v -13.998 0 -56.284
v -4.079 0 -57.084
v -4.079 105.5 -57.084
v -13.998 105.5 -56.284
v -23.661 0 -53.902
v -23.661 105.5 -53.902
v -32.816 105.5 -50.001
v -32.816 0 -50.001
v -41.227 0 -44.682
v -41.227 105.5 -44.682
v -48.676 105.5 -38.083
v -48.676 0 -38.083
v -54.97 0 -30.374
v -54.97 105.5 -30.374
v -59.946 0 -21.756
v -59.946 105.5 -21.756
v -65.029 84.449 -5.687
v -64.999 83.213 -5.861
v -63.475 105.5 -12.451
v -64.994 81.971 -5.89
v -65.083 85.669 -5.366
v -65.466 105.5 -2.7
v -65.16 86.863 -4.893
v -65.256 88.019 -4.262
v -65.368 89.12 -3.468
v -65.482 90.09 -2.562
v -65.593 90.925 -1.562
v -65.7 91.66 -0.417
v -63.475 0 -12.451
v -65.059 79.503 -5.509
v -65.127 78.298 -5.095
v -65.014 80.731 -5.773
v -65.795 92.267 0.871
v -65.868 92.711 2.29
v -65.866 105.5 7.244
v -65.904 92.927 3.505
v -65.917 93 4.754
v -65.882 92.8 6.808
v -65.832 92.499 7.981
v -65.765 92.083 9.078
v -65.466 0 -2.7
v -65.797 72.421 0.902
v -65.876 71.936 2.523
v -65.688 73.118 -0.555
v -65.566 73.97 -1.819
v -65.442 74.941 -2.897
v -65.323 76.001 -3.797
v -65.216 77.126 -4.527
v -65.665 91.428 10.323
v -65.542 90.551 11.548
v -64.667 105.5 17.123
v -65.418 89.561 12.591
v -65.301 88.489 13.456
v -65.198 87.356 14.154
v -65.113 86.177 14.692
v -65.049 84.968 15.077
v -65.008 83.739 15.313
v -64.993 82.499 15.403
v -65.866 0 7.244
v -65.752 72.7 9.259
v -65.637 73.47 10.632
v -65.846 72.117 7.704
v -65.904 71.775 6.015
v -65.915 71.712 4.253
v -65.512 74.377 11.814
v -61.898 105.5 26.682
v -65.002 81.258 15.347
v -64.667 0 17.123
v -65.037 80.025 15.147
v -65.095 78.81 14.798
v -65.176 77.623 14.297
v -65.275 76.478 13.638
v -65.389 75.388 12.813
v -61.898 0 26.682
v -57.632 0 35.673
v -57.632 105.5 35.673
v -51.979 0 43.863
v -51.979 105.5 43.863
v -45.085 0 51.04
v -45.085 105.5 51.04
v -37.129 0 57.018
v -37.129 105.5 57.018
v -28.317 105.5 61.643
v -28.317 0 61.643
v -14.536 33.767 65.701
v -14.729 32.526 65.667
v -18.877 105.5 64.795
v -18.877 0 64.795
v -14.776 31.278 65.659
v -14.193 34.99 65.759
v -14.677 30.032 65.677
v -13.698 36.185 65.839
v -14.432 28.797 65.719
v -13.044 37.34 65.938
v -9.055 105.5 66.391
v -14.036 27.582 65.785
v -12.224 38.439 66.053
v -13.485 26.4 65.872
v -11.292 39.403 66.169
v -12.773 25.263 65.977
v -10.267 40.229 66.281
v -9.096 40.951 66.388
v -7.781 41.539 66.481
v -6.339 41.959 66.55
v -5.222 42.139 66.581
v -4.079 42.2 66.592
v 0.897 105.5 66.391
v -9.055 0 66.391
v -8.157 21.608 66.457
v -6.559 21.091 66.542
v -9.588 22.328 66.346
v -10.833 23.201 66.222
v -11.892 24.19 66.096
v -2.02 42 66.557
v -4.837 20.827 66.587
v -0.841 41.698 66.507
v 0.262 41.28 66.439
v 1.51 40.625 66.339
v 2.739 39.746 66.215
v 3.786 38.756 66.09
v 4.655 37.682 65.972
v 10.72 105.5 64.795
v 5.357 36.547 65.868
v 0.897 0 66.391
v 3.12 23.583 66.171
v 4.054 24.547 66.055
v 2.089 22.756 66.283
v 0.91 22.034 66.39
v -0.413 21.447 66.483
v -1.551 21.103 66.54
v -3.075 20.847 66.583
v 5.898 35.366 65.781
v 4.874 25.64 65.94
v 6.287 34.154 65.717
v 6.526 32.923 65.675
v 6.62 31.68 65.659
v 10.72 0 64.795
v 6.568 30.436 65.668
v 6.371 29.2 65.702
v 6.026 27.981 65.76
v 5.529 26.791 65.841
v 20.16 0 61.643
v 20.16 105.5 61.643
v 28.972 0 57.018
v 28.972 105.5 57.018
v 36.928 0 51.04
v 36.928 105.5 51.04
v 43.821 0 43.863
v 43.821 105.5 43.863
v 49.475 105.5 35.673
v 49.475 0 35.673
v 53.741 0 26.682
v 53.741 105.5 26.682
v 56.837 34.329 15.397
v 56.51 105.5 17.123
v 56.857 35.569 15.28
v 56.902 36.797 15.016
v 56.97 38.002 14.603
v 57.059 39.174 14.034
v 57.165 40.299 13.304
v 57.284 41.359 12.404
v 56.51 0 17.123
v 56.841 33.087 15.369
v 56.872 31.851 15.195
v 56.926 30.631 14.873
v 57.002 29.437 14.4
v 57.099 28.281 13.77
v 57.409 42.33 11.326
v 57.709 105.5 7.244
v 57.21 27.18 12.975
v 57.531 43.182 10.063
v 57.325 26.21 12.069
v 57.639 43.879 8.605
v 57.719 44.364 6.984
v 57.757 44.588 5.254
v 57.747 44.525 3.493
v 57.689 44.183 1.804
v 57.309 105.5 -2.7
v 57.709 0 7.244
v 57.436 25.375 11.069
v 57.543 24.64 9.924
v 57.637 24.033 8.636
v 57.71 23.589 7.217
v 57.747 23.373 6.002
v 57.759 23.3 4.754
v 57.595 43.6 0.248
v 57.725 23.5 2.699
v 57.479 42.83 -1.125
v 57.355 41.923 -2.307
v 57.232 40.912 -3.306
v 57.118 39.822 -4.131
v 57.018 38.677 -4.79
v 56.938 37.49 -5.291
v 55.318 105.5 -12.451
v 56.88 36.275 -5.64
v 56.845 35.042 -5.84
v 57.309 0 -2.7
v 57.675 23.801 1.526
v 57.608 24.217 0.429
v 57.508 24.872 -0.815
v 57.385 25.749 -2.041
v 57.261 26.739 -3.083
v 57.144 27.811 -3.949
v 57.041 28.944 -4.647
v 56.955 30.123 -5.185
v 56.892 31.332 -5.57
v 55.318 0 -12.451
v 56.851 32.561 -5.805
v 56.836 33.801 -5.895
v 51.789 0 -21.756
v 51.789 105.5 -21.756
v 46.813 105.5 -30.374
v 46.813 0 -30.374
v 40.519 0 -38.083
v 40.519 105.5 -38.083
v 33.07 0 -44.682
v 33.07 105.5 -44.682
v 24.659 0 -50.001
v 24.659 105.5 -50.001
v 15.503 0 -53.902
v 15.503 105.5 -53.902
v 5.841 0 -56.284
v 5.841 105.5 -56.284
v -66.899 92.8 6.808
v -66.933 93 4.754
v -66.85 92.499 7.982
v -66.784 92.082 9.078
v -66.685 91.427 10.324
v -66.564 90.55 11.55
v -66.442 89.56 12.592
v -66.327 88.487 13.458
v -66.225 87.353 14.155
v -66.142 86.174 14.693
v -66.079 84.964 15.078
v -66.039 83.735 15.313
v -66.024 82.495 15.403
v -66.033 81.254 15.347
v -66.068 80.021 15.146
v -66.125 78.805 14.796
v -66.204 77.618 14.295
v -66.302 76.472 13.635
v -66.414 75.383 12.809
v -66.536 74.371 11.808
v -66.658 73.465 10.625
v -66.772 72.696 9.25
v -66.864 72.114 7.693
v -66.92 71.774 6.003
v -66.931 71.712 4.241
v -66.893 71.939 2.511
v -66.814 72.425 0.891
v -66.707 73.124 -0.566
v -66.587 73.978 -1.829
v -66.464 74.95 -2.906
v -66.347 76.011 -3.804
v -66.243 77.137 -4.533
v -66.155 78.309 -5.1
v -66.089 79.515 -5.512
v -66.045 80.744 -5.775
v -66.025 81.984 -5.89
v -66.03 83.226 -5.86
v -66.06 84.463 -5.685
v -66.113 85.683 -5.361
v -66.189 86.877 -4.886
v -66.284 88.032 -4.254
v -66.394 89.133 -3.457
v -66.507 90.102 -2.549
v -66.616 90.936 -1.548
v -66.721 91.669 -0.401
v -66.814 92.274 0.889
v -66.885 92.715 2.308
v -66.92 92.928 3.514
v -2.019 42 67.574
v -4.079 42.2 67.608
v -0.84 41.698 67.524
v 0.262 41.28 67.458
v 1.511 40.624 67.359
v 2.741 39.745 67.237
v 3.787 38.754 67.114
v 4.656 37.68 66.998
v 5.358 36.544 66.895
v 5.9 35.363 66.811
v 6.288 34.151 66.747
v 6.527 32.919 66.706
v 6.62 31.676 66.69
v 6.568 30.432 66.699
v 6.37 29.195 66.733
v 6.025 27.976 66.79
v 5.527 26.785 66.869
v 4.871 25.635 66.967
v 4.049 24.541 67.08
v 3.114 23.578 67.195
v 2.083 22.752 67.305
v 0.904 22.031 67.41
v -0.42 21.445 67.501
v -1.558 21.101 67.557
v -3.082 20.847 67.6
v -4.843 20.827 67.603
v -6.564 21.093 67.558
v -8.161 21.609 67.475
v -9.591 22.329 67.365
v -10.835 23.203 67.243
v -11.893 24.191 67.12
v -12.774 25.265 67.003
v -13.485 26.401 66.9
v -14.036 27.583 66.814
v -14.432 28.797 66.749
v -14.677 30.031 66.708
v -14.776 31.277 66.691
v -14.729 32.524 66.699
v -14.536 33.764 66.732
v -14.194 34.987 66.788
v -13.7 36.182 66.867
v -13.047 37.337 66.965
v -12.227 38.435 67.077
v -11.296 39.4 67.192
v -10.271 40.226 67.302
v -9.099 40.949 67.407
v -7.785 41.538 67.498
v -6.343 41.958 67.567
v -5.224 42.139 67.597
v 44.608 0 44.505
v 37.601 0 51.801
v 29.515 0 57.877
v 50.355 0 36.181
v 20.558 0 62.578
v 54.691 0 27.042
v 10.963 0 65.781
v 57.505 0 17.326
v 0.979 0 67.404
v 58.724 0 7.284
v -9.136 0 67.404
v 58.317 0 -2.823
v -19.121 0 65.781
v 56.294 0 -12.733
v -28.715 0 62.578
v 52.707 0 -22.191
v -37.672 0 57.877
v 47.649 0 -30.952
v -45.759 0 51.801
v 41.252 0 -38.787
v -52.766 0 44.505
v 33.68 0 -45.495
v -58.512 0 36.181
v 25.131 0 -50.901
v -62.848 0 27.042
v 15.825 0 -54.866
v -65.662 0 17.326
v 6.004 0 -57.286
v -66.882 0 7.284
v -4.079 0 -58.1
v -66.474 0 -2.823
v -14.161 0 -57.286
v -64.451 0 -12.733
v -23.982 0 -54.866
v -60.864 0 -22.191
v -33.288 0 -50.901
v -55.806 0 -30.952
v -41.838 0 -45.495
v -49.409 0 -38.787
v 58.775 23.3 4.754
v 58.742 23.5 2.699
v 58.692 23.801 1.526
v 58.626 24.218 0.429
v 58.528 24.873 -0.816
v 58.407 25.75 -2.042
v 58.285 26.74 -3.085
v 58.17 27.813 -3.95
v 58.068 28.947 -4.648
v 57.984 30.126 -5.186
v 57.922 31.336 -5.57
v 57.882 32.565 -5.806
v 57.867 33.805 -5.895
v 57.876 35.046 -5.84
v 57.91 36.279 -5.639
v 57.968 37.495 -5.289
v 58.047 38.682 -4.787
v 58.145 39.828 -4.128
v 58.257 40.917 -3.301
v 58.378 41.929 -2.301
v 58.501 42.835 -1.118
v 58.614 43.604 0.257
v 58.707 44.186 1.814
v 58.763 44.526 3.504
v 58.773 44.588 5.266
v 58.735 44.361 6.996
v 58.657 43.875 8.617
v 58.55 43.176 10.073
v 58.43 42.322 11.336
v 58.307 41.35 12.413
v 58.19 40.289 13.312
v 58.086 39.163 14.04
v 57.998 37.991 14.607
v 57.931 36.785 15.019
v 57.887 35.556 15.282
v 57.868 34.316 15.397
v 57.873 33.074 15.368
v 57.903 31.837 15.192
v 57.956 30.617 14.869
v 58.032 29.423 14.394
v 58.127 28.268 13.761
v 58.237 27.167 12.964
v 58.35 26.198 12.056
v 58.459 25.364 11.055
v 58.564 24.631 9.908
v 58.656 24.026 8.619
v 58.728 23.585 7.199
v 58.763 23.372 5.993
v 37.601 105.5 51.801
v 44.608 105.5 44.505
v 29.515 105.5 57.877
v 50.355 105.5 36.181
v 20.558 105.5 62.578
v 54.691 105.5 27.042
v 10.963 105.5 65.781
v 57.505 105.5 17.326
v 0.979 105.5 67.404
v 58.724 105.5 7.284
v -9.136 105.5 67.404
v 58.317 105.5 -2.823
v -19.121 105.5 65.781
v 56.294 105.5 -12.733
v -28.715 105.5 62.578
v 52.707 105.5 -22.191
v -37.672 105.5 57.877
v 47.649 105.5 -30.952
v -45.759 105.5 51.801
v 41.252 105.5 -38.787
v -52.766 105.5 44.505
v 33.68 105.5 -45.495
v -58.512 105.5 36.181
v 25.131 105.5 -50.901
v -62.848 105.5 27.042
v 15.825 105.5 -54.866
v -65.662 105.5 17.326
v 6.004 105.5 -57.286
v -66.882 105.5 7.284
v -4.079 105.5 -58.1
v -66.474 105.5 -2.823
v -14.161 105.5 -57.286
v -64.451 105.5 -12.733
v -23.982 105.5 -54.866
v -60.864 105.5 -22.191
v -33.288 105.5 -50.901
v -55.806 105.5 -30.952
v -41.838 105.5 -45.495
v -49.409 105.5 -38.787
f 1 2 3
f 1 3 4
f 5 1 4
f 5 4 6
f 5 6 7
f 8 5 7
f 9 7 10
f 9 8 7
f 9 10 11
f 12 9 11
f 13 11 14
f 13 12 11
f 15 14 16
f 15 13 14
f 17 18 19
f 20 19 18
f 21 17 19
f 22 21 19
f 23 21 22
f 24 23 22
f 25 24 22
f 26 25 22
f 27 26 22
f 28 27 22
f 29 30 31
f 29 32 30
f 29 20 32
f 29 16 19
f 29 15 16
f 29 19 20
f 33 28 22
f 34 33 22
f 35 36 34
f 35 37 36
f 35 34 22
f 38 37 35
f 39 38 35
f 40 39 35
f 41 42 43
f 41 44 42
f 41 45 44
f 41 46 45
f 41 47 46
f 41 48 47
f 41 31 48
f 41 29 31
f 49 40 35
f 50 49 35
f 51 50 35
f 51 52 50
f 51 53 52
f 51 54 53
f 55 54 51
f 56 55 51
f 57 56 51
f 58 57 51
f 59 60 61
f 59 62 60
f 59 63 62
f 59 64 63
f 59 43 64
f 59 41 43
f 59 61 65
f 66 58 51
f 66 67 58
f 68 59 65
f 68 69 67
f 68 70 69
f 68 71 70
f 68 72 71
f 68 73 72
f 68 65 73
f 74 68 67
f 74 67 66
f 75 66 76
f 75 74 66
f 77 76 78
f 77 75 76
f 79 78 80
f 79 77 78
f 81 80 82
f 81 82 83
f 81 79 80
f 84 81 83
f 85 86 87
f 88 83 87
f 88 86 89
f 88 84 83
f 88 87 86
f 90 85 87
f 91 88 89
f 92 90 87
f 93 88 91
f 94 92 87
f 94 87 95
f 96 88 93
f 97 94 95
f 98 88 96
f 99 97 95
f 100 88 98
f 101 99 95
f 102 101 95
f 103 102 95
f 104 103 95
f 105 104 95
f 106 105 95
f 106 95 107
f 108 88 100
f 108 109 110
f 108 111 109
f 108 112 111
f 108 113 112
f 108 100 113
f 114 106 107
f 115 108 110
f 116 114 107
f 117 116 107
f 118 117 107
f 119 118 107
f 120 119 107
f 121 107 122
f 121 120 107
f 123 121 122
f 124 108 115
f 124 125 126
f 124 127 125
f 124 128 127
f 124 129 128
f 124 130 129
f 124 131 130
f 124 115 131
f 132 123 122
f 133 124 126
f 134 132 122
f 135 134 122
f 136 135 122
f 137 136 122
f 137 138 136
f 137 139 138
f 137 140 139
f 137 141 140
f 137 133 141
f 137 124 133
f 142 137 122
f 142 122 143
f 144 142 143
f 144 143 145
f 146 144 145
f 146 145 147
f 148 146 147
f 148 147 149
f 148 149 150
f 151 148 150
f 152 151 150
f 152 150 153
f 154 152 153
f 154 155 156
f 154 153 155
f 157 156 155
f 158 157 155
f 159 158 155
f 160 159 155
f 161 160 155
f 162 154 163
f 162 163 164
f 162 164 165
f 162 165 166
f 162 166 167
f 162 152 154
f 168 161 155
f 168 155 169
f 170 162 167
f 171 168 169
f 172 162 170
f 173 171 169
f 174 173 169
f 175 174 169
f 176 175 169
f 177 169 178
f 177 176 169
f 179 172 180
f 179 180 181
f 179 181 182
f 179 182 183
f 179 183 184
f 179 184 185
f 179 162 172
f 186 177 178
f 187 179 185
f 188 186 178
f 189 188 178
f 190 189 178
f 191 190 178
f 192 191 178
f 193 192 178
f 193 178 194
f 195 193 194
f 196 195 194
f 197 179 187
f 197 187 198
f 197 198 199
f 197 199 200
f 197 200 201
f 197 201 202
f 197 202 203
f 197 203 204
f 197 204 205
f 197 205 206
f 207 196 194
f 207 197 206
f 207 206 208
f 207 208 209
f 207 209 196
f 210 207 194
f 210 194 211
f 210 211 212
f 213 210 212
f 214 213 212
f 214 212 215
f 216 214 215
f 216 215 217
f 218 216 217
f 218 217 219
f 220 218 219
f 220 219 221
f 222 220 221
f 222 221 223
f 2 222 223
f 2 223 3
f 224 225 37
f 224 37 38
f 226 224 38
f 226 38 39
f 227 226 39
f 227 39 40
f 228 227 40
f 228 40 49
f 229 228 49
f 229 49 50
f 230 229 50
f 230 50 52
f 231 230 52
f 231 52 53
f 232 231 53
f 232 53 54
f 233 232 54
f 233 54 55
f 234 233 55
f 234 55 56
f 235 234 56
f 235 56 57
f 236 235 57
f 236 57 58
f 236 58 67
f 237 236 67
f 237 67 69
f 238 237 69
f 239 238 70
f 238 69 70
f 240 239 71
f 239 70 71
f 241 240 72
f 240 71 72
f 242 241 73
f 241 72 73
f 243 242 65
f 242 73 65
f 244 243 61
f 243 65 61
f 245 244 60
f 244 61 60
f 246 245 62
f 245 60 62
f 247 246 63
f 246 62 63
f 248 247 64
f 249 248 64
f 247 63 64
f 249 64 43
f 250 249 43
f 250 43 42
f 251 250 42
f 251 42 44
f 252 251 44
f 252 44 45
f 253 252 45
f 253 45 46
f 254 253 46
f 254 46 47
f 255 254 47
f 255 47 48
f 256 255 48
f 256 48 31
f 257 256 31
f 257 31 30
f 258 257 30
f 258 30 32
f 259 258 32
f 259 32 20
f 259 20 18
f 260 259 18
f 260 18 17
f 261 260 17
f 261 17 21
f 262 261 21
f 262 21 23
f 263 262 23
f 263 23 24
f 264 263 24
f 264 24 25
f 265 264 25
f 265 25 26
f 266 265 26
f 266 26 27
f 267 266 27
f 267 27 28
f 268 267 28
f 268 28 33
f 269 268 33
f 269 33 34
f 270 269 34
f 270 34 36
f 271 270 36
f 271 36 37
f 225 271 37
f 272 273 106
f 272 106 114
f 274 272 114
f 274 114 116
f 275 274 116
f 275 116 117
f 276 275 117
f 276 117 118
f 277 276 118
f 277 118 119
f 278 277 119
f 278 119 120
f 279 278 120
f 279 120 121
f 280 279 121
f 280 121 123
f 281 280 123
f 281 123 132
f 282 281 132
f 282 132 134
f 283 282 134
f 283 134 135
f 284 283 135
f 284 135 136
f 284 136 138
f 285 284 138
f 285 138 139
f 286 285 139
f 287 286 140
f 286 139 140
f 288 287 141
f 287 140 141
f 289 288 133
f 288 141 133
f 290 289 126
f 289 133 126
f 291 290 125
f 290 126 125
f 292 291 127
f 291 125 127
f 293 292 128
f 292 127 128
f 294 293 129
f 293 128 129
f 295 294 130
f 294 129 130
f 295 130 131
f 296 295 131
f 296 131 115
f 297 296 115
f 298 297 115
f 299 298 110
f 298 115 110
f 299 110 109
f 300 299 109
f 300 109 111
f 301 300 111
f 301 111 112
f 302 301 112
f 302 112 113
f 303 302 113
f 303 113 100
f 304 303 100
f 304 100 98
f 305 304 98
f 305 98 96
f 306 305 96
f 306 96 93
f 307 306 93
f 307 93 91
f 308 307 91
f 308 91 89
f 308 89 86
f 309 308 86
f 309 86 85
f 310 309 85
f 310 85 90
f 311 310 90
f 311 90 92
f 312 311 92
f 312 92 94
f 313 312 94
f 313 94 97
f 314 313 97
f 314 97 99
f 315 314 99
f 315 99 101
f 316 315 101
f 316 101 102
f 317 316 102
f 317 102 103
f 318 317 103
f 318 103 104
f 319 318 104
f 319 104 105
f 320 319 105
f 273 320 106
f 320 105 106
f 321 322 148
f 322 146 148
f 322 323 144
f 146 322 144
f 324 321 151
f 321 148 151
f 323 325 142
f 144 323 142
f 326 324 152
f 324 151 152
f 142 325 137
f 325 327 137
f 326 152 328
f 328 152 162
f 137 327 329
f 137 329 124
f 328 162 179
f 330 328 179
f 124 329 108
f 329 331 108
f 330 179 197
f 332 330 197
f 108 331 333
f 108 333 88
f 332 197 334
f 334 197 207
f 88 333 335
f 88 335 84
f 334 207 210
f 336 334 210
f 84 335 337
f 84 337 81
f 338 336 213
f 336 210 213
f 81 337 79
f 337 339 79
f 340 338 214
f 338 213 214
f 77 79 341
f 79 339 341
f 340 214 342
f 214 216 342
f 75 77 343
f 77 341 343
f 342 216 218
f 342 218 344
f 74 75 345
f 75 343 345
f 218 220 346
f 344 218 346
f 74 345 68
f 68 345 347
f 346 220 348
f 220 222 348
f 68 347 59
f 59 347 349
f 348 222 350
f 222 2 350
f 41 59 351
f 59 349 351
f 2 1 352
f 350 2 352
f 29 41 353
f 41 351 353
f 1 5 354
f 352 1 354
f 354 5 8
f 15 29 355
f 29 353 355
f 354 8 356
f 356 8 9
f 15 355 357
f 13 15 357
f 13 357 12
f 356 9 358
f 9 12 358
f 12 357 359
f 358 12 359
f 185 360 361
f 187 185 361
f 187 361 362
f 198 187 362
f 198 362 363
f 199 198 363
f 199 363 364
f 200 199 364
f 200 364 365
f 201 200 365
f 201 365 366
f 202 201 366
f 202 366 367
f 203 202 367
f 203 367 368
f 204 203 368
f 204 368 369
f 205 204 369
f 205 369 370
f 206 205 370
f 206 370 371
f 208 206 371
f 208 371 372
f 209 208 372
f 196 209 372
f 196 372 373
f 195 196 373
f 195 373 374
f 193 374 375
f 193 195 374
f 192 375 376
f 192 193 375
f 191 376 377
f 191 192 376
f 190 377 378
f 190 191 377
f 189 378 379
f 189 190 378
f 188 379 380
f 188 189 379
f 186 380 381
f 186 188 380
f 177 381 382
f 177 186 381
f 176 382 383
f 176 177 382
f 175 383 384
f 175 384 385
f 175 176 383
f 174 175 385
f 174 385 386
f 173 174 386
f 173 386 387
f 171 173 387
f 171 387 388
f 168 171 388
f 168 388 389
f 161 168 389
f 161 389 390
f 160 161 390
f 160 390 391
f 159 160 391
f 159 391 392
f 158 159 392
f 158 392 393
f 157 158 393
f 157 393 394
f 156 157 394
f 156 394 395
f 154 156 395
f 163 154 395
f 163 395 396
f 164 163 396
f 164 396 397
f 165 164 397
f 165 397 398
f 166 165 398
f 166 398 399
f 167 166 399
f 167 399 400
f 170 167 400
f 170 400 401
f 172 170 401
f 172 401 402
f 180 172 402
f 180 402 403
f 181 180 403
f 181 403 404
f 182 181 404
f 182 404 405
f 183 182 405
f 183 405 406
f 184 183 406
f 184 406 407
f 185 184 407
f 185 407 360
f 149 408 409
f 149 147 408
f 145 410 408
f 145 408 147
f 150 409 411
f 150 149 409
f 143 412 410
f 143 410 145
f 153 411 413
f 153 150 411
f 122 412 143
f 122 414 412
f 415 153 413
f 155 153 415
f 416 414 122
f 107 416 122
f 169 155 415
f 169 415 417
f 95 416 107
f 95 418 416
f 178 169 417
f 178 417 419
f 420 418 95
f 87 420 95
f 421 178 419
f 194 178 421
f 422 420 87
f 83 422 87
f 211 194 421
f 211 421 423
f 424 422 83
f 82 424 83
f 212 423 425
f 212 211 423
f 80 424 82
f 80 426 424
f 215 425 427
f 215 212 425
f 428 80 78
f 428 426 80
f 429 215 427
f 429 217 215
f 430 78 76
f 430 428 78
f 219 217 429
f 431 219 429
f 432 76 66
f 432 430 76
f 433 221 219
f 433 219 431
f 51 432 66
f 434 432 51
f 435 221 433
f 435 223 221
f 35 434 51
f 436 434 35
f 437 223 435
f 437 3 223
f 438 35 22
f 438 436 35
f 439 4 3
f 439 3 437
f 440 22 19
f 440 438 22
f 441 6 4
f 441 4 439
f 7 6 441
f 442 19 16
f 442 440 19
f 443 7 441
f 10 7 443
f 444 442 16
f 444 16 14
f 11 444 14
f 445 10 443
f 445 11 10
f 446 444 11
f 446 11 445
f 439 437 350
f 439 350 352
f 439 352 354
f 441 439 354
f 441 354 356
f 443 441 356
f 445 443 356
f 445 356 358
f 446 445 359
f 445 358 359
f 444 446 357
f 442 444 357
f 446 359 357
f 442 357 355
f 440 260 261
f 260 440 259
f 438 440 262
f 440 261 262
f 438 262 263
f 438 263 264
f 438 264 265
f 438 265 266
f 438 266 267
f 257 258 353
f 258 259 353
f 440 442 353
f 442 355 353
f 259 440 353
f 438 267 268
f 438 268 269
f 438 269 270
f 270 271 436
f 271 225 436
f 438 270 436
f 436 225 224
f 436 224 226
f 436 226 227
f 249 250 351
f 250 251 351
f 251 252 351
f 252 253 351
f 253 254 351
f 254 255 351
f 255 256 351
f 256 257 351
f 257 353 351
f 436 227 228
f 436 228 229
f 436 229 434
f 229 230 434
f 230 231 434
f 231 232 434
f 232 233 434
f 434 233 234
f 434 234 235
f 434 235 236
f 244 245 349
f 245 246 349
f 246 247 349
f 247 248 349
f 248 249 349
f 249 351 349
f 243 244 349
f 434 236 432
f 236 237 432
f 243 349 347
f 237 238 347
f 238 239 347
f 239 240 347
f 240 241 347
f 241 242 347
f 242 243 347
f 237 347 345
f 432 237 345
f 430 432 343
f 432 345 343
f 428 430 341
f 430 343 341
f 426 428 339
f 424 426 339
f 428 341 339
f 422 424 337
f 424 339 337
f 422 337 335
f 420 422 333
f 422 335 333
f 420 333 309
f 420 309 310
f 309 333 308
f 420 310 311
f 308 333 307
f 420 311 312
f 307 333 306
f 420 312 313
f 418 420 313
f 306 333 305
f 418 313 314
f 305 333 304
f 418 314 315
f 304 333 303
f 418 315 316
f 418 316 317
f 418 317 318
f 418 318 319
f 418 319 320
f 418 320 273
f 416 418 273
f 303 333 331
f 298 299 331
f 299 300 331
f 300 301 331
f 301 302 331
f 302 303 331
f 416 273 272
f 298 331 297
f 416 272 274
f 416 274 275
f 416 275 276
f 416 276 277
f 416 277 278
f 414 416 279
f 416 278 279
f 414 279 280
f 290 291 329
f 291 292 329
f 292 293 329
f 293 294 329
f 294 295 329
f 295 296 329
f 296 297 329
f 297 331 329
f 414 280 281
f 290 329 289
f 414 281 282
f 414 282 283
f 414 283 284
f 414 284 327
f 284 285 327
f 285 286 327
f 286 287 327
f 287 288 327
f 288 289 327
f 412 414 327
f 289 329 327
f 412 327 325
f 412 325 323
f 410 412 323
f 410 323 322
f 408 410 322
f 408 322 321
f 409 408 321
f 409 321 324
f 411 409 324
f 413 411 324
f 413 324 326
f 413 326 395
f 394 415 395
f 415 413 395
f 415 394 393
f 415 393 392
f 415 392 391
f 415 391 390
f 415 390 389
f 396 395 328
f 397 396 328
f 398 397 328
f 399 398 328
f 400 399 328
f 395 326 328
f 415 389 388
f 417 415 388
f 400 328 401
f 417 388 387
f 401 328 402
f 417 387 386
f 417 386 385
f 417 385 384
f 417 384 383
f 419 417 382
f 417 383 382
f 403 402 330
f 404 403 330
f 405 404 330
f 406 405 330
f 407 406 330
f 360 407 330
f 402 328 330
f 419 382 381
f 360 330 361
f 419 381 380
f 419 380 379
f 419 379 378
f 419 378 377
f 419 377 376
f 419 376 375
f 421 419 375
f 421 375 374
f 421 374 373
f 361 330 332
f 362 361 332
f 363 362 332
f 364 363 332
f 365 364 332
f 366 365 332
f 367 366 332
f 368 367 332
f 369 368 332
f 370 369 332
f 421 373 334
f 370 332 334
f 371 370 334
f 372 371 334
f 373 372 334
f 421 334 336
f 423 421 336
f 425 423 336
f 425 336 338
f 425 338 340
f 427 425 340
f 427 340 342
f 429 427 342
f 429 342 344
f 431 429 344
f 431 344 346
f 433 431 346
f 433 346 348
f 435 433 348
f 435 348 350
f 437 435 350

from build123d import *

# Parameters (mm, degrees)
SKETCH2_R           = 62.854
SKETCH2_R_2         = 61.838
BOSS_EXTRUDE1_DEPTH = 105.5
SKETCH3_R           = 10.7
CUT_EXTRUDE1_DEPTH  = 105.5
SKETCH4_R           = 10.65
CUT_EXTRUDE2_DEPTH  = 105.5
SKETCH5_R           = 10.65
CUT_EXTRUDE3_DEPTH  = 105.5


with BuildPart() as part:
    # Sketch2 → Boss-Extrude1 (new body)
    with BuildSketch(Plane(origin=(0, 0, 0), x_dir=(-1, 0, 0), z_dir=(0, 1, 0))):
        with Locations(Location((4.078625789, 4.753613482, 0), (0, 0, 270))):
            Circle(SKETCH2_R)
        with Locations(Location((4.078625789, 4.753613482, 0), (0, 0, 270))):
            Circle(SKETCH2_R_2, mode=Mode.SUBTRACT)
    extrude(amount=BOSS_EXTRUDE1_DEPTH)

    # Sketch3 → Cut-Extrude1 (cut)
    with BuildSketch(Plane(origin=(-8.080908151, 23.599932993, 4.753613482), x_dir=(-1, 0, 0), z_dir=(0, 0, -1))):
        with Locations(Location((-4.002282363, 7.900067007, 0), (0, 0, 90))):
            Circle(SKETCH3_R)
    extrude(amount=-CUT_EXTRUDE1_DEPTH, mode=Mode.SUBTRACT)

    # Sketch4 → Cut-Extrude2 (cut)
    with BuildSketch(Plane(origin=(-4.078625789, 23.599932993, 9.571680039), x_dir=(0, 0, -1), z_dir=(1, 0, 0))):
        with Locations(Location((4.818066557, 10.350067007, 0), (0, 0, 270))):
            Circle(SKETCH4_R)
    extrude(amount=CUT_EXTRUDE2_DEPTH, mode=Mode.SUBTRACT)

    # Sketch5 → Cut-Extrude3 (cut)
    with BuildSketch(Plane(origin=(-4.078625789, 23.599932993, 9.571680039), x_dir=(0, 0, -1), z_dir=(1, 0, 0))):
        with Locations(Location((4.818066557, 58.750067007, 0), (0, 0, 90))):
            Circle(SKETCH5_R)
    extrude(amount=-CUT_EXTRUDE3_DEPTH, mode=Mode.SUBTRACT)


solid = part.part
